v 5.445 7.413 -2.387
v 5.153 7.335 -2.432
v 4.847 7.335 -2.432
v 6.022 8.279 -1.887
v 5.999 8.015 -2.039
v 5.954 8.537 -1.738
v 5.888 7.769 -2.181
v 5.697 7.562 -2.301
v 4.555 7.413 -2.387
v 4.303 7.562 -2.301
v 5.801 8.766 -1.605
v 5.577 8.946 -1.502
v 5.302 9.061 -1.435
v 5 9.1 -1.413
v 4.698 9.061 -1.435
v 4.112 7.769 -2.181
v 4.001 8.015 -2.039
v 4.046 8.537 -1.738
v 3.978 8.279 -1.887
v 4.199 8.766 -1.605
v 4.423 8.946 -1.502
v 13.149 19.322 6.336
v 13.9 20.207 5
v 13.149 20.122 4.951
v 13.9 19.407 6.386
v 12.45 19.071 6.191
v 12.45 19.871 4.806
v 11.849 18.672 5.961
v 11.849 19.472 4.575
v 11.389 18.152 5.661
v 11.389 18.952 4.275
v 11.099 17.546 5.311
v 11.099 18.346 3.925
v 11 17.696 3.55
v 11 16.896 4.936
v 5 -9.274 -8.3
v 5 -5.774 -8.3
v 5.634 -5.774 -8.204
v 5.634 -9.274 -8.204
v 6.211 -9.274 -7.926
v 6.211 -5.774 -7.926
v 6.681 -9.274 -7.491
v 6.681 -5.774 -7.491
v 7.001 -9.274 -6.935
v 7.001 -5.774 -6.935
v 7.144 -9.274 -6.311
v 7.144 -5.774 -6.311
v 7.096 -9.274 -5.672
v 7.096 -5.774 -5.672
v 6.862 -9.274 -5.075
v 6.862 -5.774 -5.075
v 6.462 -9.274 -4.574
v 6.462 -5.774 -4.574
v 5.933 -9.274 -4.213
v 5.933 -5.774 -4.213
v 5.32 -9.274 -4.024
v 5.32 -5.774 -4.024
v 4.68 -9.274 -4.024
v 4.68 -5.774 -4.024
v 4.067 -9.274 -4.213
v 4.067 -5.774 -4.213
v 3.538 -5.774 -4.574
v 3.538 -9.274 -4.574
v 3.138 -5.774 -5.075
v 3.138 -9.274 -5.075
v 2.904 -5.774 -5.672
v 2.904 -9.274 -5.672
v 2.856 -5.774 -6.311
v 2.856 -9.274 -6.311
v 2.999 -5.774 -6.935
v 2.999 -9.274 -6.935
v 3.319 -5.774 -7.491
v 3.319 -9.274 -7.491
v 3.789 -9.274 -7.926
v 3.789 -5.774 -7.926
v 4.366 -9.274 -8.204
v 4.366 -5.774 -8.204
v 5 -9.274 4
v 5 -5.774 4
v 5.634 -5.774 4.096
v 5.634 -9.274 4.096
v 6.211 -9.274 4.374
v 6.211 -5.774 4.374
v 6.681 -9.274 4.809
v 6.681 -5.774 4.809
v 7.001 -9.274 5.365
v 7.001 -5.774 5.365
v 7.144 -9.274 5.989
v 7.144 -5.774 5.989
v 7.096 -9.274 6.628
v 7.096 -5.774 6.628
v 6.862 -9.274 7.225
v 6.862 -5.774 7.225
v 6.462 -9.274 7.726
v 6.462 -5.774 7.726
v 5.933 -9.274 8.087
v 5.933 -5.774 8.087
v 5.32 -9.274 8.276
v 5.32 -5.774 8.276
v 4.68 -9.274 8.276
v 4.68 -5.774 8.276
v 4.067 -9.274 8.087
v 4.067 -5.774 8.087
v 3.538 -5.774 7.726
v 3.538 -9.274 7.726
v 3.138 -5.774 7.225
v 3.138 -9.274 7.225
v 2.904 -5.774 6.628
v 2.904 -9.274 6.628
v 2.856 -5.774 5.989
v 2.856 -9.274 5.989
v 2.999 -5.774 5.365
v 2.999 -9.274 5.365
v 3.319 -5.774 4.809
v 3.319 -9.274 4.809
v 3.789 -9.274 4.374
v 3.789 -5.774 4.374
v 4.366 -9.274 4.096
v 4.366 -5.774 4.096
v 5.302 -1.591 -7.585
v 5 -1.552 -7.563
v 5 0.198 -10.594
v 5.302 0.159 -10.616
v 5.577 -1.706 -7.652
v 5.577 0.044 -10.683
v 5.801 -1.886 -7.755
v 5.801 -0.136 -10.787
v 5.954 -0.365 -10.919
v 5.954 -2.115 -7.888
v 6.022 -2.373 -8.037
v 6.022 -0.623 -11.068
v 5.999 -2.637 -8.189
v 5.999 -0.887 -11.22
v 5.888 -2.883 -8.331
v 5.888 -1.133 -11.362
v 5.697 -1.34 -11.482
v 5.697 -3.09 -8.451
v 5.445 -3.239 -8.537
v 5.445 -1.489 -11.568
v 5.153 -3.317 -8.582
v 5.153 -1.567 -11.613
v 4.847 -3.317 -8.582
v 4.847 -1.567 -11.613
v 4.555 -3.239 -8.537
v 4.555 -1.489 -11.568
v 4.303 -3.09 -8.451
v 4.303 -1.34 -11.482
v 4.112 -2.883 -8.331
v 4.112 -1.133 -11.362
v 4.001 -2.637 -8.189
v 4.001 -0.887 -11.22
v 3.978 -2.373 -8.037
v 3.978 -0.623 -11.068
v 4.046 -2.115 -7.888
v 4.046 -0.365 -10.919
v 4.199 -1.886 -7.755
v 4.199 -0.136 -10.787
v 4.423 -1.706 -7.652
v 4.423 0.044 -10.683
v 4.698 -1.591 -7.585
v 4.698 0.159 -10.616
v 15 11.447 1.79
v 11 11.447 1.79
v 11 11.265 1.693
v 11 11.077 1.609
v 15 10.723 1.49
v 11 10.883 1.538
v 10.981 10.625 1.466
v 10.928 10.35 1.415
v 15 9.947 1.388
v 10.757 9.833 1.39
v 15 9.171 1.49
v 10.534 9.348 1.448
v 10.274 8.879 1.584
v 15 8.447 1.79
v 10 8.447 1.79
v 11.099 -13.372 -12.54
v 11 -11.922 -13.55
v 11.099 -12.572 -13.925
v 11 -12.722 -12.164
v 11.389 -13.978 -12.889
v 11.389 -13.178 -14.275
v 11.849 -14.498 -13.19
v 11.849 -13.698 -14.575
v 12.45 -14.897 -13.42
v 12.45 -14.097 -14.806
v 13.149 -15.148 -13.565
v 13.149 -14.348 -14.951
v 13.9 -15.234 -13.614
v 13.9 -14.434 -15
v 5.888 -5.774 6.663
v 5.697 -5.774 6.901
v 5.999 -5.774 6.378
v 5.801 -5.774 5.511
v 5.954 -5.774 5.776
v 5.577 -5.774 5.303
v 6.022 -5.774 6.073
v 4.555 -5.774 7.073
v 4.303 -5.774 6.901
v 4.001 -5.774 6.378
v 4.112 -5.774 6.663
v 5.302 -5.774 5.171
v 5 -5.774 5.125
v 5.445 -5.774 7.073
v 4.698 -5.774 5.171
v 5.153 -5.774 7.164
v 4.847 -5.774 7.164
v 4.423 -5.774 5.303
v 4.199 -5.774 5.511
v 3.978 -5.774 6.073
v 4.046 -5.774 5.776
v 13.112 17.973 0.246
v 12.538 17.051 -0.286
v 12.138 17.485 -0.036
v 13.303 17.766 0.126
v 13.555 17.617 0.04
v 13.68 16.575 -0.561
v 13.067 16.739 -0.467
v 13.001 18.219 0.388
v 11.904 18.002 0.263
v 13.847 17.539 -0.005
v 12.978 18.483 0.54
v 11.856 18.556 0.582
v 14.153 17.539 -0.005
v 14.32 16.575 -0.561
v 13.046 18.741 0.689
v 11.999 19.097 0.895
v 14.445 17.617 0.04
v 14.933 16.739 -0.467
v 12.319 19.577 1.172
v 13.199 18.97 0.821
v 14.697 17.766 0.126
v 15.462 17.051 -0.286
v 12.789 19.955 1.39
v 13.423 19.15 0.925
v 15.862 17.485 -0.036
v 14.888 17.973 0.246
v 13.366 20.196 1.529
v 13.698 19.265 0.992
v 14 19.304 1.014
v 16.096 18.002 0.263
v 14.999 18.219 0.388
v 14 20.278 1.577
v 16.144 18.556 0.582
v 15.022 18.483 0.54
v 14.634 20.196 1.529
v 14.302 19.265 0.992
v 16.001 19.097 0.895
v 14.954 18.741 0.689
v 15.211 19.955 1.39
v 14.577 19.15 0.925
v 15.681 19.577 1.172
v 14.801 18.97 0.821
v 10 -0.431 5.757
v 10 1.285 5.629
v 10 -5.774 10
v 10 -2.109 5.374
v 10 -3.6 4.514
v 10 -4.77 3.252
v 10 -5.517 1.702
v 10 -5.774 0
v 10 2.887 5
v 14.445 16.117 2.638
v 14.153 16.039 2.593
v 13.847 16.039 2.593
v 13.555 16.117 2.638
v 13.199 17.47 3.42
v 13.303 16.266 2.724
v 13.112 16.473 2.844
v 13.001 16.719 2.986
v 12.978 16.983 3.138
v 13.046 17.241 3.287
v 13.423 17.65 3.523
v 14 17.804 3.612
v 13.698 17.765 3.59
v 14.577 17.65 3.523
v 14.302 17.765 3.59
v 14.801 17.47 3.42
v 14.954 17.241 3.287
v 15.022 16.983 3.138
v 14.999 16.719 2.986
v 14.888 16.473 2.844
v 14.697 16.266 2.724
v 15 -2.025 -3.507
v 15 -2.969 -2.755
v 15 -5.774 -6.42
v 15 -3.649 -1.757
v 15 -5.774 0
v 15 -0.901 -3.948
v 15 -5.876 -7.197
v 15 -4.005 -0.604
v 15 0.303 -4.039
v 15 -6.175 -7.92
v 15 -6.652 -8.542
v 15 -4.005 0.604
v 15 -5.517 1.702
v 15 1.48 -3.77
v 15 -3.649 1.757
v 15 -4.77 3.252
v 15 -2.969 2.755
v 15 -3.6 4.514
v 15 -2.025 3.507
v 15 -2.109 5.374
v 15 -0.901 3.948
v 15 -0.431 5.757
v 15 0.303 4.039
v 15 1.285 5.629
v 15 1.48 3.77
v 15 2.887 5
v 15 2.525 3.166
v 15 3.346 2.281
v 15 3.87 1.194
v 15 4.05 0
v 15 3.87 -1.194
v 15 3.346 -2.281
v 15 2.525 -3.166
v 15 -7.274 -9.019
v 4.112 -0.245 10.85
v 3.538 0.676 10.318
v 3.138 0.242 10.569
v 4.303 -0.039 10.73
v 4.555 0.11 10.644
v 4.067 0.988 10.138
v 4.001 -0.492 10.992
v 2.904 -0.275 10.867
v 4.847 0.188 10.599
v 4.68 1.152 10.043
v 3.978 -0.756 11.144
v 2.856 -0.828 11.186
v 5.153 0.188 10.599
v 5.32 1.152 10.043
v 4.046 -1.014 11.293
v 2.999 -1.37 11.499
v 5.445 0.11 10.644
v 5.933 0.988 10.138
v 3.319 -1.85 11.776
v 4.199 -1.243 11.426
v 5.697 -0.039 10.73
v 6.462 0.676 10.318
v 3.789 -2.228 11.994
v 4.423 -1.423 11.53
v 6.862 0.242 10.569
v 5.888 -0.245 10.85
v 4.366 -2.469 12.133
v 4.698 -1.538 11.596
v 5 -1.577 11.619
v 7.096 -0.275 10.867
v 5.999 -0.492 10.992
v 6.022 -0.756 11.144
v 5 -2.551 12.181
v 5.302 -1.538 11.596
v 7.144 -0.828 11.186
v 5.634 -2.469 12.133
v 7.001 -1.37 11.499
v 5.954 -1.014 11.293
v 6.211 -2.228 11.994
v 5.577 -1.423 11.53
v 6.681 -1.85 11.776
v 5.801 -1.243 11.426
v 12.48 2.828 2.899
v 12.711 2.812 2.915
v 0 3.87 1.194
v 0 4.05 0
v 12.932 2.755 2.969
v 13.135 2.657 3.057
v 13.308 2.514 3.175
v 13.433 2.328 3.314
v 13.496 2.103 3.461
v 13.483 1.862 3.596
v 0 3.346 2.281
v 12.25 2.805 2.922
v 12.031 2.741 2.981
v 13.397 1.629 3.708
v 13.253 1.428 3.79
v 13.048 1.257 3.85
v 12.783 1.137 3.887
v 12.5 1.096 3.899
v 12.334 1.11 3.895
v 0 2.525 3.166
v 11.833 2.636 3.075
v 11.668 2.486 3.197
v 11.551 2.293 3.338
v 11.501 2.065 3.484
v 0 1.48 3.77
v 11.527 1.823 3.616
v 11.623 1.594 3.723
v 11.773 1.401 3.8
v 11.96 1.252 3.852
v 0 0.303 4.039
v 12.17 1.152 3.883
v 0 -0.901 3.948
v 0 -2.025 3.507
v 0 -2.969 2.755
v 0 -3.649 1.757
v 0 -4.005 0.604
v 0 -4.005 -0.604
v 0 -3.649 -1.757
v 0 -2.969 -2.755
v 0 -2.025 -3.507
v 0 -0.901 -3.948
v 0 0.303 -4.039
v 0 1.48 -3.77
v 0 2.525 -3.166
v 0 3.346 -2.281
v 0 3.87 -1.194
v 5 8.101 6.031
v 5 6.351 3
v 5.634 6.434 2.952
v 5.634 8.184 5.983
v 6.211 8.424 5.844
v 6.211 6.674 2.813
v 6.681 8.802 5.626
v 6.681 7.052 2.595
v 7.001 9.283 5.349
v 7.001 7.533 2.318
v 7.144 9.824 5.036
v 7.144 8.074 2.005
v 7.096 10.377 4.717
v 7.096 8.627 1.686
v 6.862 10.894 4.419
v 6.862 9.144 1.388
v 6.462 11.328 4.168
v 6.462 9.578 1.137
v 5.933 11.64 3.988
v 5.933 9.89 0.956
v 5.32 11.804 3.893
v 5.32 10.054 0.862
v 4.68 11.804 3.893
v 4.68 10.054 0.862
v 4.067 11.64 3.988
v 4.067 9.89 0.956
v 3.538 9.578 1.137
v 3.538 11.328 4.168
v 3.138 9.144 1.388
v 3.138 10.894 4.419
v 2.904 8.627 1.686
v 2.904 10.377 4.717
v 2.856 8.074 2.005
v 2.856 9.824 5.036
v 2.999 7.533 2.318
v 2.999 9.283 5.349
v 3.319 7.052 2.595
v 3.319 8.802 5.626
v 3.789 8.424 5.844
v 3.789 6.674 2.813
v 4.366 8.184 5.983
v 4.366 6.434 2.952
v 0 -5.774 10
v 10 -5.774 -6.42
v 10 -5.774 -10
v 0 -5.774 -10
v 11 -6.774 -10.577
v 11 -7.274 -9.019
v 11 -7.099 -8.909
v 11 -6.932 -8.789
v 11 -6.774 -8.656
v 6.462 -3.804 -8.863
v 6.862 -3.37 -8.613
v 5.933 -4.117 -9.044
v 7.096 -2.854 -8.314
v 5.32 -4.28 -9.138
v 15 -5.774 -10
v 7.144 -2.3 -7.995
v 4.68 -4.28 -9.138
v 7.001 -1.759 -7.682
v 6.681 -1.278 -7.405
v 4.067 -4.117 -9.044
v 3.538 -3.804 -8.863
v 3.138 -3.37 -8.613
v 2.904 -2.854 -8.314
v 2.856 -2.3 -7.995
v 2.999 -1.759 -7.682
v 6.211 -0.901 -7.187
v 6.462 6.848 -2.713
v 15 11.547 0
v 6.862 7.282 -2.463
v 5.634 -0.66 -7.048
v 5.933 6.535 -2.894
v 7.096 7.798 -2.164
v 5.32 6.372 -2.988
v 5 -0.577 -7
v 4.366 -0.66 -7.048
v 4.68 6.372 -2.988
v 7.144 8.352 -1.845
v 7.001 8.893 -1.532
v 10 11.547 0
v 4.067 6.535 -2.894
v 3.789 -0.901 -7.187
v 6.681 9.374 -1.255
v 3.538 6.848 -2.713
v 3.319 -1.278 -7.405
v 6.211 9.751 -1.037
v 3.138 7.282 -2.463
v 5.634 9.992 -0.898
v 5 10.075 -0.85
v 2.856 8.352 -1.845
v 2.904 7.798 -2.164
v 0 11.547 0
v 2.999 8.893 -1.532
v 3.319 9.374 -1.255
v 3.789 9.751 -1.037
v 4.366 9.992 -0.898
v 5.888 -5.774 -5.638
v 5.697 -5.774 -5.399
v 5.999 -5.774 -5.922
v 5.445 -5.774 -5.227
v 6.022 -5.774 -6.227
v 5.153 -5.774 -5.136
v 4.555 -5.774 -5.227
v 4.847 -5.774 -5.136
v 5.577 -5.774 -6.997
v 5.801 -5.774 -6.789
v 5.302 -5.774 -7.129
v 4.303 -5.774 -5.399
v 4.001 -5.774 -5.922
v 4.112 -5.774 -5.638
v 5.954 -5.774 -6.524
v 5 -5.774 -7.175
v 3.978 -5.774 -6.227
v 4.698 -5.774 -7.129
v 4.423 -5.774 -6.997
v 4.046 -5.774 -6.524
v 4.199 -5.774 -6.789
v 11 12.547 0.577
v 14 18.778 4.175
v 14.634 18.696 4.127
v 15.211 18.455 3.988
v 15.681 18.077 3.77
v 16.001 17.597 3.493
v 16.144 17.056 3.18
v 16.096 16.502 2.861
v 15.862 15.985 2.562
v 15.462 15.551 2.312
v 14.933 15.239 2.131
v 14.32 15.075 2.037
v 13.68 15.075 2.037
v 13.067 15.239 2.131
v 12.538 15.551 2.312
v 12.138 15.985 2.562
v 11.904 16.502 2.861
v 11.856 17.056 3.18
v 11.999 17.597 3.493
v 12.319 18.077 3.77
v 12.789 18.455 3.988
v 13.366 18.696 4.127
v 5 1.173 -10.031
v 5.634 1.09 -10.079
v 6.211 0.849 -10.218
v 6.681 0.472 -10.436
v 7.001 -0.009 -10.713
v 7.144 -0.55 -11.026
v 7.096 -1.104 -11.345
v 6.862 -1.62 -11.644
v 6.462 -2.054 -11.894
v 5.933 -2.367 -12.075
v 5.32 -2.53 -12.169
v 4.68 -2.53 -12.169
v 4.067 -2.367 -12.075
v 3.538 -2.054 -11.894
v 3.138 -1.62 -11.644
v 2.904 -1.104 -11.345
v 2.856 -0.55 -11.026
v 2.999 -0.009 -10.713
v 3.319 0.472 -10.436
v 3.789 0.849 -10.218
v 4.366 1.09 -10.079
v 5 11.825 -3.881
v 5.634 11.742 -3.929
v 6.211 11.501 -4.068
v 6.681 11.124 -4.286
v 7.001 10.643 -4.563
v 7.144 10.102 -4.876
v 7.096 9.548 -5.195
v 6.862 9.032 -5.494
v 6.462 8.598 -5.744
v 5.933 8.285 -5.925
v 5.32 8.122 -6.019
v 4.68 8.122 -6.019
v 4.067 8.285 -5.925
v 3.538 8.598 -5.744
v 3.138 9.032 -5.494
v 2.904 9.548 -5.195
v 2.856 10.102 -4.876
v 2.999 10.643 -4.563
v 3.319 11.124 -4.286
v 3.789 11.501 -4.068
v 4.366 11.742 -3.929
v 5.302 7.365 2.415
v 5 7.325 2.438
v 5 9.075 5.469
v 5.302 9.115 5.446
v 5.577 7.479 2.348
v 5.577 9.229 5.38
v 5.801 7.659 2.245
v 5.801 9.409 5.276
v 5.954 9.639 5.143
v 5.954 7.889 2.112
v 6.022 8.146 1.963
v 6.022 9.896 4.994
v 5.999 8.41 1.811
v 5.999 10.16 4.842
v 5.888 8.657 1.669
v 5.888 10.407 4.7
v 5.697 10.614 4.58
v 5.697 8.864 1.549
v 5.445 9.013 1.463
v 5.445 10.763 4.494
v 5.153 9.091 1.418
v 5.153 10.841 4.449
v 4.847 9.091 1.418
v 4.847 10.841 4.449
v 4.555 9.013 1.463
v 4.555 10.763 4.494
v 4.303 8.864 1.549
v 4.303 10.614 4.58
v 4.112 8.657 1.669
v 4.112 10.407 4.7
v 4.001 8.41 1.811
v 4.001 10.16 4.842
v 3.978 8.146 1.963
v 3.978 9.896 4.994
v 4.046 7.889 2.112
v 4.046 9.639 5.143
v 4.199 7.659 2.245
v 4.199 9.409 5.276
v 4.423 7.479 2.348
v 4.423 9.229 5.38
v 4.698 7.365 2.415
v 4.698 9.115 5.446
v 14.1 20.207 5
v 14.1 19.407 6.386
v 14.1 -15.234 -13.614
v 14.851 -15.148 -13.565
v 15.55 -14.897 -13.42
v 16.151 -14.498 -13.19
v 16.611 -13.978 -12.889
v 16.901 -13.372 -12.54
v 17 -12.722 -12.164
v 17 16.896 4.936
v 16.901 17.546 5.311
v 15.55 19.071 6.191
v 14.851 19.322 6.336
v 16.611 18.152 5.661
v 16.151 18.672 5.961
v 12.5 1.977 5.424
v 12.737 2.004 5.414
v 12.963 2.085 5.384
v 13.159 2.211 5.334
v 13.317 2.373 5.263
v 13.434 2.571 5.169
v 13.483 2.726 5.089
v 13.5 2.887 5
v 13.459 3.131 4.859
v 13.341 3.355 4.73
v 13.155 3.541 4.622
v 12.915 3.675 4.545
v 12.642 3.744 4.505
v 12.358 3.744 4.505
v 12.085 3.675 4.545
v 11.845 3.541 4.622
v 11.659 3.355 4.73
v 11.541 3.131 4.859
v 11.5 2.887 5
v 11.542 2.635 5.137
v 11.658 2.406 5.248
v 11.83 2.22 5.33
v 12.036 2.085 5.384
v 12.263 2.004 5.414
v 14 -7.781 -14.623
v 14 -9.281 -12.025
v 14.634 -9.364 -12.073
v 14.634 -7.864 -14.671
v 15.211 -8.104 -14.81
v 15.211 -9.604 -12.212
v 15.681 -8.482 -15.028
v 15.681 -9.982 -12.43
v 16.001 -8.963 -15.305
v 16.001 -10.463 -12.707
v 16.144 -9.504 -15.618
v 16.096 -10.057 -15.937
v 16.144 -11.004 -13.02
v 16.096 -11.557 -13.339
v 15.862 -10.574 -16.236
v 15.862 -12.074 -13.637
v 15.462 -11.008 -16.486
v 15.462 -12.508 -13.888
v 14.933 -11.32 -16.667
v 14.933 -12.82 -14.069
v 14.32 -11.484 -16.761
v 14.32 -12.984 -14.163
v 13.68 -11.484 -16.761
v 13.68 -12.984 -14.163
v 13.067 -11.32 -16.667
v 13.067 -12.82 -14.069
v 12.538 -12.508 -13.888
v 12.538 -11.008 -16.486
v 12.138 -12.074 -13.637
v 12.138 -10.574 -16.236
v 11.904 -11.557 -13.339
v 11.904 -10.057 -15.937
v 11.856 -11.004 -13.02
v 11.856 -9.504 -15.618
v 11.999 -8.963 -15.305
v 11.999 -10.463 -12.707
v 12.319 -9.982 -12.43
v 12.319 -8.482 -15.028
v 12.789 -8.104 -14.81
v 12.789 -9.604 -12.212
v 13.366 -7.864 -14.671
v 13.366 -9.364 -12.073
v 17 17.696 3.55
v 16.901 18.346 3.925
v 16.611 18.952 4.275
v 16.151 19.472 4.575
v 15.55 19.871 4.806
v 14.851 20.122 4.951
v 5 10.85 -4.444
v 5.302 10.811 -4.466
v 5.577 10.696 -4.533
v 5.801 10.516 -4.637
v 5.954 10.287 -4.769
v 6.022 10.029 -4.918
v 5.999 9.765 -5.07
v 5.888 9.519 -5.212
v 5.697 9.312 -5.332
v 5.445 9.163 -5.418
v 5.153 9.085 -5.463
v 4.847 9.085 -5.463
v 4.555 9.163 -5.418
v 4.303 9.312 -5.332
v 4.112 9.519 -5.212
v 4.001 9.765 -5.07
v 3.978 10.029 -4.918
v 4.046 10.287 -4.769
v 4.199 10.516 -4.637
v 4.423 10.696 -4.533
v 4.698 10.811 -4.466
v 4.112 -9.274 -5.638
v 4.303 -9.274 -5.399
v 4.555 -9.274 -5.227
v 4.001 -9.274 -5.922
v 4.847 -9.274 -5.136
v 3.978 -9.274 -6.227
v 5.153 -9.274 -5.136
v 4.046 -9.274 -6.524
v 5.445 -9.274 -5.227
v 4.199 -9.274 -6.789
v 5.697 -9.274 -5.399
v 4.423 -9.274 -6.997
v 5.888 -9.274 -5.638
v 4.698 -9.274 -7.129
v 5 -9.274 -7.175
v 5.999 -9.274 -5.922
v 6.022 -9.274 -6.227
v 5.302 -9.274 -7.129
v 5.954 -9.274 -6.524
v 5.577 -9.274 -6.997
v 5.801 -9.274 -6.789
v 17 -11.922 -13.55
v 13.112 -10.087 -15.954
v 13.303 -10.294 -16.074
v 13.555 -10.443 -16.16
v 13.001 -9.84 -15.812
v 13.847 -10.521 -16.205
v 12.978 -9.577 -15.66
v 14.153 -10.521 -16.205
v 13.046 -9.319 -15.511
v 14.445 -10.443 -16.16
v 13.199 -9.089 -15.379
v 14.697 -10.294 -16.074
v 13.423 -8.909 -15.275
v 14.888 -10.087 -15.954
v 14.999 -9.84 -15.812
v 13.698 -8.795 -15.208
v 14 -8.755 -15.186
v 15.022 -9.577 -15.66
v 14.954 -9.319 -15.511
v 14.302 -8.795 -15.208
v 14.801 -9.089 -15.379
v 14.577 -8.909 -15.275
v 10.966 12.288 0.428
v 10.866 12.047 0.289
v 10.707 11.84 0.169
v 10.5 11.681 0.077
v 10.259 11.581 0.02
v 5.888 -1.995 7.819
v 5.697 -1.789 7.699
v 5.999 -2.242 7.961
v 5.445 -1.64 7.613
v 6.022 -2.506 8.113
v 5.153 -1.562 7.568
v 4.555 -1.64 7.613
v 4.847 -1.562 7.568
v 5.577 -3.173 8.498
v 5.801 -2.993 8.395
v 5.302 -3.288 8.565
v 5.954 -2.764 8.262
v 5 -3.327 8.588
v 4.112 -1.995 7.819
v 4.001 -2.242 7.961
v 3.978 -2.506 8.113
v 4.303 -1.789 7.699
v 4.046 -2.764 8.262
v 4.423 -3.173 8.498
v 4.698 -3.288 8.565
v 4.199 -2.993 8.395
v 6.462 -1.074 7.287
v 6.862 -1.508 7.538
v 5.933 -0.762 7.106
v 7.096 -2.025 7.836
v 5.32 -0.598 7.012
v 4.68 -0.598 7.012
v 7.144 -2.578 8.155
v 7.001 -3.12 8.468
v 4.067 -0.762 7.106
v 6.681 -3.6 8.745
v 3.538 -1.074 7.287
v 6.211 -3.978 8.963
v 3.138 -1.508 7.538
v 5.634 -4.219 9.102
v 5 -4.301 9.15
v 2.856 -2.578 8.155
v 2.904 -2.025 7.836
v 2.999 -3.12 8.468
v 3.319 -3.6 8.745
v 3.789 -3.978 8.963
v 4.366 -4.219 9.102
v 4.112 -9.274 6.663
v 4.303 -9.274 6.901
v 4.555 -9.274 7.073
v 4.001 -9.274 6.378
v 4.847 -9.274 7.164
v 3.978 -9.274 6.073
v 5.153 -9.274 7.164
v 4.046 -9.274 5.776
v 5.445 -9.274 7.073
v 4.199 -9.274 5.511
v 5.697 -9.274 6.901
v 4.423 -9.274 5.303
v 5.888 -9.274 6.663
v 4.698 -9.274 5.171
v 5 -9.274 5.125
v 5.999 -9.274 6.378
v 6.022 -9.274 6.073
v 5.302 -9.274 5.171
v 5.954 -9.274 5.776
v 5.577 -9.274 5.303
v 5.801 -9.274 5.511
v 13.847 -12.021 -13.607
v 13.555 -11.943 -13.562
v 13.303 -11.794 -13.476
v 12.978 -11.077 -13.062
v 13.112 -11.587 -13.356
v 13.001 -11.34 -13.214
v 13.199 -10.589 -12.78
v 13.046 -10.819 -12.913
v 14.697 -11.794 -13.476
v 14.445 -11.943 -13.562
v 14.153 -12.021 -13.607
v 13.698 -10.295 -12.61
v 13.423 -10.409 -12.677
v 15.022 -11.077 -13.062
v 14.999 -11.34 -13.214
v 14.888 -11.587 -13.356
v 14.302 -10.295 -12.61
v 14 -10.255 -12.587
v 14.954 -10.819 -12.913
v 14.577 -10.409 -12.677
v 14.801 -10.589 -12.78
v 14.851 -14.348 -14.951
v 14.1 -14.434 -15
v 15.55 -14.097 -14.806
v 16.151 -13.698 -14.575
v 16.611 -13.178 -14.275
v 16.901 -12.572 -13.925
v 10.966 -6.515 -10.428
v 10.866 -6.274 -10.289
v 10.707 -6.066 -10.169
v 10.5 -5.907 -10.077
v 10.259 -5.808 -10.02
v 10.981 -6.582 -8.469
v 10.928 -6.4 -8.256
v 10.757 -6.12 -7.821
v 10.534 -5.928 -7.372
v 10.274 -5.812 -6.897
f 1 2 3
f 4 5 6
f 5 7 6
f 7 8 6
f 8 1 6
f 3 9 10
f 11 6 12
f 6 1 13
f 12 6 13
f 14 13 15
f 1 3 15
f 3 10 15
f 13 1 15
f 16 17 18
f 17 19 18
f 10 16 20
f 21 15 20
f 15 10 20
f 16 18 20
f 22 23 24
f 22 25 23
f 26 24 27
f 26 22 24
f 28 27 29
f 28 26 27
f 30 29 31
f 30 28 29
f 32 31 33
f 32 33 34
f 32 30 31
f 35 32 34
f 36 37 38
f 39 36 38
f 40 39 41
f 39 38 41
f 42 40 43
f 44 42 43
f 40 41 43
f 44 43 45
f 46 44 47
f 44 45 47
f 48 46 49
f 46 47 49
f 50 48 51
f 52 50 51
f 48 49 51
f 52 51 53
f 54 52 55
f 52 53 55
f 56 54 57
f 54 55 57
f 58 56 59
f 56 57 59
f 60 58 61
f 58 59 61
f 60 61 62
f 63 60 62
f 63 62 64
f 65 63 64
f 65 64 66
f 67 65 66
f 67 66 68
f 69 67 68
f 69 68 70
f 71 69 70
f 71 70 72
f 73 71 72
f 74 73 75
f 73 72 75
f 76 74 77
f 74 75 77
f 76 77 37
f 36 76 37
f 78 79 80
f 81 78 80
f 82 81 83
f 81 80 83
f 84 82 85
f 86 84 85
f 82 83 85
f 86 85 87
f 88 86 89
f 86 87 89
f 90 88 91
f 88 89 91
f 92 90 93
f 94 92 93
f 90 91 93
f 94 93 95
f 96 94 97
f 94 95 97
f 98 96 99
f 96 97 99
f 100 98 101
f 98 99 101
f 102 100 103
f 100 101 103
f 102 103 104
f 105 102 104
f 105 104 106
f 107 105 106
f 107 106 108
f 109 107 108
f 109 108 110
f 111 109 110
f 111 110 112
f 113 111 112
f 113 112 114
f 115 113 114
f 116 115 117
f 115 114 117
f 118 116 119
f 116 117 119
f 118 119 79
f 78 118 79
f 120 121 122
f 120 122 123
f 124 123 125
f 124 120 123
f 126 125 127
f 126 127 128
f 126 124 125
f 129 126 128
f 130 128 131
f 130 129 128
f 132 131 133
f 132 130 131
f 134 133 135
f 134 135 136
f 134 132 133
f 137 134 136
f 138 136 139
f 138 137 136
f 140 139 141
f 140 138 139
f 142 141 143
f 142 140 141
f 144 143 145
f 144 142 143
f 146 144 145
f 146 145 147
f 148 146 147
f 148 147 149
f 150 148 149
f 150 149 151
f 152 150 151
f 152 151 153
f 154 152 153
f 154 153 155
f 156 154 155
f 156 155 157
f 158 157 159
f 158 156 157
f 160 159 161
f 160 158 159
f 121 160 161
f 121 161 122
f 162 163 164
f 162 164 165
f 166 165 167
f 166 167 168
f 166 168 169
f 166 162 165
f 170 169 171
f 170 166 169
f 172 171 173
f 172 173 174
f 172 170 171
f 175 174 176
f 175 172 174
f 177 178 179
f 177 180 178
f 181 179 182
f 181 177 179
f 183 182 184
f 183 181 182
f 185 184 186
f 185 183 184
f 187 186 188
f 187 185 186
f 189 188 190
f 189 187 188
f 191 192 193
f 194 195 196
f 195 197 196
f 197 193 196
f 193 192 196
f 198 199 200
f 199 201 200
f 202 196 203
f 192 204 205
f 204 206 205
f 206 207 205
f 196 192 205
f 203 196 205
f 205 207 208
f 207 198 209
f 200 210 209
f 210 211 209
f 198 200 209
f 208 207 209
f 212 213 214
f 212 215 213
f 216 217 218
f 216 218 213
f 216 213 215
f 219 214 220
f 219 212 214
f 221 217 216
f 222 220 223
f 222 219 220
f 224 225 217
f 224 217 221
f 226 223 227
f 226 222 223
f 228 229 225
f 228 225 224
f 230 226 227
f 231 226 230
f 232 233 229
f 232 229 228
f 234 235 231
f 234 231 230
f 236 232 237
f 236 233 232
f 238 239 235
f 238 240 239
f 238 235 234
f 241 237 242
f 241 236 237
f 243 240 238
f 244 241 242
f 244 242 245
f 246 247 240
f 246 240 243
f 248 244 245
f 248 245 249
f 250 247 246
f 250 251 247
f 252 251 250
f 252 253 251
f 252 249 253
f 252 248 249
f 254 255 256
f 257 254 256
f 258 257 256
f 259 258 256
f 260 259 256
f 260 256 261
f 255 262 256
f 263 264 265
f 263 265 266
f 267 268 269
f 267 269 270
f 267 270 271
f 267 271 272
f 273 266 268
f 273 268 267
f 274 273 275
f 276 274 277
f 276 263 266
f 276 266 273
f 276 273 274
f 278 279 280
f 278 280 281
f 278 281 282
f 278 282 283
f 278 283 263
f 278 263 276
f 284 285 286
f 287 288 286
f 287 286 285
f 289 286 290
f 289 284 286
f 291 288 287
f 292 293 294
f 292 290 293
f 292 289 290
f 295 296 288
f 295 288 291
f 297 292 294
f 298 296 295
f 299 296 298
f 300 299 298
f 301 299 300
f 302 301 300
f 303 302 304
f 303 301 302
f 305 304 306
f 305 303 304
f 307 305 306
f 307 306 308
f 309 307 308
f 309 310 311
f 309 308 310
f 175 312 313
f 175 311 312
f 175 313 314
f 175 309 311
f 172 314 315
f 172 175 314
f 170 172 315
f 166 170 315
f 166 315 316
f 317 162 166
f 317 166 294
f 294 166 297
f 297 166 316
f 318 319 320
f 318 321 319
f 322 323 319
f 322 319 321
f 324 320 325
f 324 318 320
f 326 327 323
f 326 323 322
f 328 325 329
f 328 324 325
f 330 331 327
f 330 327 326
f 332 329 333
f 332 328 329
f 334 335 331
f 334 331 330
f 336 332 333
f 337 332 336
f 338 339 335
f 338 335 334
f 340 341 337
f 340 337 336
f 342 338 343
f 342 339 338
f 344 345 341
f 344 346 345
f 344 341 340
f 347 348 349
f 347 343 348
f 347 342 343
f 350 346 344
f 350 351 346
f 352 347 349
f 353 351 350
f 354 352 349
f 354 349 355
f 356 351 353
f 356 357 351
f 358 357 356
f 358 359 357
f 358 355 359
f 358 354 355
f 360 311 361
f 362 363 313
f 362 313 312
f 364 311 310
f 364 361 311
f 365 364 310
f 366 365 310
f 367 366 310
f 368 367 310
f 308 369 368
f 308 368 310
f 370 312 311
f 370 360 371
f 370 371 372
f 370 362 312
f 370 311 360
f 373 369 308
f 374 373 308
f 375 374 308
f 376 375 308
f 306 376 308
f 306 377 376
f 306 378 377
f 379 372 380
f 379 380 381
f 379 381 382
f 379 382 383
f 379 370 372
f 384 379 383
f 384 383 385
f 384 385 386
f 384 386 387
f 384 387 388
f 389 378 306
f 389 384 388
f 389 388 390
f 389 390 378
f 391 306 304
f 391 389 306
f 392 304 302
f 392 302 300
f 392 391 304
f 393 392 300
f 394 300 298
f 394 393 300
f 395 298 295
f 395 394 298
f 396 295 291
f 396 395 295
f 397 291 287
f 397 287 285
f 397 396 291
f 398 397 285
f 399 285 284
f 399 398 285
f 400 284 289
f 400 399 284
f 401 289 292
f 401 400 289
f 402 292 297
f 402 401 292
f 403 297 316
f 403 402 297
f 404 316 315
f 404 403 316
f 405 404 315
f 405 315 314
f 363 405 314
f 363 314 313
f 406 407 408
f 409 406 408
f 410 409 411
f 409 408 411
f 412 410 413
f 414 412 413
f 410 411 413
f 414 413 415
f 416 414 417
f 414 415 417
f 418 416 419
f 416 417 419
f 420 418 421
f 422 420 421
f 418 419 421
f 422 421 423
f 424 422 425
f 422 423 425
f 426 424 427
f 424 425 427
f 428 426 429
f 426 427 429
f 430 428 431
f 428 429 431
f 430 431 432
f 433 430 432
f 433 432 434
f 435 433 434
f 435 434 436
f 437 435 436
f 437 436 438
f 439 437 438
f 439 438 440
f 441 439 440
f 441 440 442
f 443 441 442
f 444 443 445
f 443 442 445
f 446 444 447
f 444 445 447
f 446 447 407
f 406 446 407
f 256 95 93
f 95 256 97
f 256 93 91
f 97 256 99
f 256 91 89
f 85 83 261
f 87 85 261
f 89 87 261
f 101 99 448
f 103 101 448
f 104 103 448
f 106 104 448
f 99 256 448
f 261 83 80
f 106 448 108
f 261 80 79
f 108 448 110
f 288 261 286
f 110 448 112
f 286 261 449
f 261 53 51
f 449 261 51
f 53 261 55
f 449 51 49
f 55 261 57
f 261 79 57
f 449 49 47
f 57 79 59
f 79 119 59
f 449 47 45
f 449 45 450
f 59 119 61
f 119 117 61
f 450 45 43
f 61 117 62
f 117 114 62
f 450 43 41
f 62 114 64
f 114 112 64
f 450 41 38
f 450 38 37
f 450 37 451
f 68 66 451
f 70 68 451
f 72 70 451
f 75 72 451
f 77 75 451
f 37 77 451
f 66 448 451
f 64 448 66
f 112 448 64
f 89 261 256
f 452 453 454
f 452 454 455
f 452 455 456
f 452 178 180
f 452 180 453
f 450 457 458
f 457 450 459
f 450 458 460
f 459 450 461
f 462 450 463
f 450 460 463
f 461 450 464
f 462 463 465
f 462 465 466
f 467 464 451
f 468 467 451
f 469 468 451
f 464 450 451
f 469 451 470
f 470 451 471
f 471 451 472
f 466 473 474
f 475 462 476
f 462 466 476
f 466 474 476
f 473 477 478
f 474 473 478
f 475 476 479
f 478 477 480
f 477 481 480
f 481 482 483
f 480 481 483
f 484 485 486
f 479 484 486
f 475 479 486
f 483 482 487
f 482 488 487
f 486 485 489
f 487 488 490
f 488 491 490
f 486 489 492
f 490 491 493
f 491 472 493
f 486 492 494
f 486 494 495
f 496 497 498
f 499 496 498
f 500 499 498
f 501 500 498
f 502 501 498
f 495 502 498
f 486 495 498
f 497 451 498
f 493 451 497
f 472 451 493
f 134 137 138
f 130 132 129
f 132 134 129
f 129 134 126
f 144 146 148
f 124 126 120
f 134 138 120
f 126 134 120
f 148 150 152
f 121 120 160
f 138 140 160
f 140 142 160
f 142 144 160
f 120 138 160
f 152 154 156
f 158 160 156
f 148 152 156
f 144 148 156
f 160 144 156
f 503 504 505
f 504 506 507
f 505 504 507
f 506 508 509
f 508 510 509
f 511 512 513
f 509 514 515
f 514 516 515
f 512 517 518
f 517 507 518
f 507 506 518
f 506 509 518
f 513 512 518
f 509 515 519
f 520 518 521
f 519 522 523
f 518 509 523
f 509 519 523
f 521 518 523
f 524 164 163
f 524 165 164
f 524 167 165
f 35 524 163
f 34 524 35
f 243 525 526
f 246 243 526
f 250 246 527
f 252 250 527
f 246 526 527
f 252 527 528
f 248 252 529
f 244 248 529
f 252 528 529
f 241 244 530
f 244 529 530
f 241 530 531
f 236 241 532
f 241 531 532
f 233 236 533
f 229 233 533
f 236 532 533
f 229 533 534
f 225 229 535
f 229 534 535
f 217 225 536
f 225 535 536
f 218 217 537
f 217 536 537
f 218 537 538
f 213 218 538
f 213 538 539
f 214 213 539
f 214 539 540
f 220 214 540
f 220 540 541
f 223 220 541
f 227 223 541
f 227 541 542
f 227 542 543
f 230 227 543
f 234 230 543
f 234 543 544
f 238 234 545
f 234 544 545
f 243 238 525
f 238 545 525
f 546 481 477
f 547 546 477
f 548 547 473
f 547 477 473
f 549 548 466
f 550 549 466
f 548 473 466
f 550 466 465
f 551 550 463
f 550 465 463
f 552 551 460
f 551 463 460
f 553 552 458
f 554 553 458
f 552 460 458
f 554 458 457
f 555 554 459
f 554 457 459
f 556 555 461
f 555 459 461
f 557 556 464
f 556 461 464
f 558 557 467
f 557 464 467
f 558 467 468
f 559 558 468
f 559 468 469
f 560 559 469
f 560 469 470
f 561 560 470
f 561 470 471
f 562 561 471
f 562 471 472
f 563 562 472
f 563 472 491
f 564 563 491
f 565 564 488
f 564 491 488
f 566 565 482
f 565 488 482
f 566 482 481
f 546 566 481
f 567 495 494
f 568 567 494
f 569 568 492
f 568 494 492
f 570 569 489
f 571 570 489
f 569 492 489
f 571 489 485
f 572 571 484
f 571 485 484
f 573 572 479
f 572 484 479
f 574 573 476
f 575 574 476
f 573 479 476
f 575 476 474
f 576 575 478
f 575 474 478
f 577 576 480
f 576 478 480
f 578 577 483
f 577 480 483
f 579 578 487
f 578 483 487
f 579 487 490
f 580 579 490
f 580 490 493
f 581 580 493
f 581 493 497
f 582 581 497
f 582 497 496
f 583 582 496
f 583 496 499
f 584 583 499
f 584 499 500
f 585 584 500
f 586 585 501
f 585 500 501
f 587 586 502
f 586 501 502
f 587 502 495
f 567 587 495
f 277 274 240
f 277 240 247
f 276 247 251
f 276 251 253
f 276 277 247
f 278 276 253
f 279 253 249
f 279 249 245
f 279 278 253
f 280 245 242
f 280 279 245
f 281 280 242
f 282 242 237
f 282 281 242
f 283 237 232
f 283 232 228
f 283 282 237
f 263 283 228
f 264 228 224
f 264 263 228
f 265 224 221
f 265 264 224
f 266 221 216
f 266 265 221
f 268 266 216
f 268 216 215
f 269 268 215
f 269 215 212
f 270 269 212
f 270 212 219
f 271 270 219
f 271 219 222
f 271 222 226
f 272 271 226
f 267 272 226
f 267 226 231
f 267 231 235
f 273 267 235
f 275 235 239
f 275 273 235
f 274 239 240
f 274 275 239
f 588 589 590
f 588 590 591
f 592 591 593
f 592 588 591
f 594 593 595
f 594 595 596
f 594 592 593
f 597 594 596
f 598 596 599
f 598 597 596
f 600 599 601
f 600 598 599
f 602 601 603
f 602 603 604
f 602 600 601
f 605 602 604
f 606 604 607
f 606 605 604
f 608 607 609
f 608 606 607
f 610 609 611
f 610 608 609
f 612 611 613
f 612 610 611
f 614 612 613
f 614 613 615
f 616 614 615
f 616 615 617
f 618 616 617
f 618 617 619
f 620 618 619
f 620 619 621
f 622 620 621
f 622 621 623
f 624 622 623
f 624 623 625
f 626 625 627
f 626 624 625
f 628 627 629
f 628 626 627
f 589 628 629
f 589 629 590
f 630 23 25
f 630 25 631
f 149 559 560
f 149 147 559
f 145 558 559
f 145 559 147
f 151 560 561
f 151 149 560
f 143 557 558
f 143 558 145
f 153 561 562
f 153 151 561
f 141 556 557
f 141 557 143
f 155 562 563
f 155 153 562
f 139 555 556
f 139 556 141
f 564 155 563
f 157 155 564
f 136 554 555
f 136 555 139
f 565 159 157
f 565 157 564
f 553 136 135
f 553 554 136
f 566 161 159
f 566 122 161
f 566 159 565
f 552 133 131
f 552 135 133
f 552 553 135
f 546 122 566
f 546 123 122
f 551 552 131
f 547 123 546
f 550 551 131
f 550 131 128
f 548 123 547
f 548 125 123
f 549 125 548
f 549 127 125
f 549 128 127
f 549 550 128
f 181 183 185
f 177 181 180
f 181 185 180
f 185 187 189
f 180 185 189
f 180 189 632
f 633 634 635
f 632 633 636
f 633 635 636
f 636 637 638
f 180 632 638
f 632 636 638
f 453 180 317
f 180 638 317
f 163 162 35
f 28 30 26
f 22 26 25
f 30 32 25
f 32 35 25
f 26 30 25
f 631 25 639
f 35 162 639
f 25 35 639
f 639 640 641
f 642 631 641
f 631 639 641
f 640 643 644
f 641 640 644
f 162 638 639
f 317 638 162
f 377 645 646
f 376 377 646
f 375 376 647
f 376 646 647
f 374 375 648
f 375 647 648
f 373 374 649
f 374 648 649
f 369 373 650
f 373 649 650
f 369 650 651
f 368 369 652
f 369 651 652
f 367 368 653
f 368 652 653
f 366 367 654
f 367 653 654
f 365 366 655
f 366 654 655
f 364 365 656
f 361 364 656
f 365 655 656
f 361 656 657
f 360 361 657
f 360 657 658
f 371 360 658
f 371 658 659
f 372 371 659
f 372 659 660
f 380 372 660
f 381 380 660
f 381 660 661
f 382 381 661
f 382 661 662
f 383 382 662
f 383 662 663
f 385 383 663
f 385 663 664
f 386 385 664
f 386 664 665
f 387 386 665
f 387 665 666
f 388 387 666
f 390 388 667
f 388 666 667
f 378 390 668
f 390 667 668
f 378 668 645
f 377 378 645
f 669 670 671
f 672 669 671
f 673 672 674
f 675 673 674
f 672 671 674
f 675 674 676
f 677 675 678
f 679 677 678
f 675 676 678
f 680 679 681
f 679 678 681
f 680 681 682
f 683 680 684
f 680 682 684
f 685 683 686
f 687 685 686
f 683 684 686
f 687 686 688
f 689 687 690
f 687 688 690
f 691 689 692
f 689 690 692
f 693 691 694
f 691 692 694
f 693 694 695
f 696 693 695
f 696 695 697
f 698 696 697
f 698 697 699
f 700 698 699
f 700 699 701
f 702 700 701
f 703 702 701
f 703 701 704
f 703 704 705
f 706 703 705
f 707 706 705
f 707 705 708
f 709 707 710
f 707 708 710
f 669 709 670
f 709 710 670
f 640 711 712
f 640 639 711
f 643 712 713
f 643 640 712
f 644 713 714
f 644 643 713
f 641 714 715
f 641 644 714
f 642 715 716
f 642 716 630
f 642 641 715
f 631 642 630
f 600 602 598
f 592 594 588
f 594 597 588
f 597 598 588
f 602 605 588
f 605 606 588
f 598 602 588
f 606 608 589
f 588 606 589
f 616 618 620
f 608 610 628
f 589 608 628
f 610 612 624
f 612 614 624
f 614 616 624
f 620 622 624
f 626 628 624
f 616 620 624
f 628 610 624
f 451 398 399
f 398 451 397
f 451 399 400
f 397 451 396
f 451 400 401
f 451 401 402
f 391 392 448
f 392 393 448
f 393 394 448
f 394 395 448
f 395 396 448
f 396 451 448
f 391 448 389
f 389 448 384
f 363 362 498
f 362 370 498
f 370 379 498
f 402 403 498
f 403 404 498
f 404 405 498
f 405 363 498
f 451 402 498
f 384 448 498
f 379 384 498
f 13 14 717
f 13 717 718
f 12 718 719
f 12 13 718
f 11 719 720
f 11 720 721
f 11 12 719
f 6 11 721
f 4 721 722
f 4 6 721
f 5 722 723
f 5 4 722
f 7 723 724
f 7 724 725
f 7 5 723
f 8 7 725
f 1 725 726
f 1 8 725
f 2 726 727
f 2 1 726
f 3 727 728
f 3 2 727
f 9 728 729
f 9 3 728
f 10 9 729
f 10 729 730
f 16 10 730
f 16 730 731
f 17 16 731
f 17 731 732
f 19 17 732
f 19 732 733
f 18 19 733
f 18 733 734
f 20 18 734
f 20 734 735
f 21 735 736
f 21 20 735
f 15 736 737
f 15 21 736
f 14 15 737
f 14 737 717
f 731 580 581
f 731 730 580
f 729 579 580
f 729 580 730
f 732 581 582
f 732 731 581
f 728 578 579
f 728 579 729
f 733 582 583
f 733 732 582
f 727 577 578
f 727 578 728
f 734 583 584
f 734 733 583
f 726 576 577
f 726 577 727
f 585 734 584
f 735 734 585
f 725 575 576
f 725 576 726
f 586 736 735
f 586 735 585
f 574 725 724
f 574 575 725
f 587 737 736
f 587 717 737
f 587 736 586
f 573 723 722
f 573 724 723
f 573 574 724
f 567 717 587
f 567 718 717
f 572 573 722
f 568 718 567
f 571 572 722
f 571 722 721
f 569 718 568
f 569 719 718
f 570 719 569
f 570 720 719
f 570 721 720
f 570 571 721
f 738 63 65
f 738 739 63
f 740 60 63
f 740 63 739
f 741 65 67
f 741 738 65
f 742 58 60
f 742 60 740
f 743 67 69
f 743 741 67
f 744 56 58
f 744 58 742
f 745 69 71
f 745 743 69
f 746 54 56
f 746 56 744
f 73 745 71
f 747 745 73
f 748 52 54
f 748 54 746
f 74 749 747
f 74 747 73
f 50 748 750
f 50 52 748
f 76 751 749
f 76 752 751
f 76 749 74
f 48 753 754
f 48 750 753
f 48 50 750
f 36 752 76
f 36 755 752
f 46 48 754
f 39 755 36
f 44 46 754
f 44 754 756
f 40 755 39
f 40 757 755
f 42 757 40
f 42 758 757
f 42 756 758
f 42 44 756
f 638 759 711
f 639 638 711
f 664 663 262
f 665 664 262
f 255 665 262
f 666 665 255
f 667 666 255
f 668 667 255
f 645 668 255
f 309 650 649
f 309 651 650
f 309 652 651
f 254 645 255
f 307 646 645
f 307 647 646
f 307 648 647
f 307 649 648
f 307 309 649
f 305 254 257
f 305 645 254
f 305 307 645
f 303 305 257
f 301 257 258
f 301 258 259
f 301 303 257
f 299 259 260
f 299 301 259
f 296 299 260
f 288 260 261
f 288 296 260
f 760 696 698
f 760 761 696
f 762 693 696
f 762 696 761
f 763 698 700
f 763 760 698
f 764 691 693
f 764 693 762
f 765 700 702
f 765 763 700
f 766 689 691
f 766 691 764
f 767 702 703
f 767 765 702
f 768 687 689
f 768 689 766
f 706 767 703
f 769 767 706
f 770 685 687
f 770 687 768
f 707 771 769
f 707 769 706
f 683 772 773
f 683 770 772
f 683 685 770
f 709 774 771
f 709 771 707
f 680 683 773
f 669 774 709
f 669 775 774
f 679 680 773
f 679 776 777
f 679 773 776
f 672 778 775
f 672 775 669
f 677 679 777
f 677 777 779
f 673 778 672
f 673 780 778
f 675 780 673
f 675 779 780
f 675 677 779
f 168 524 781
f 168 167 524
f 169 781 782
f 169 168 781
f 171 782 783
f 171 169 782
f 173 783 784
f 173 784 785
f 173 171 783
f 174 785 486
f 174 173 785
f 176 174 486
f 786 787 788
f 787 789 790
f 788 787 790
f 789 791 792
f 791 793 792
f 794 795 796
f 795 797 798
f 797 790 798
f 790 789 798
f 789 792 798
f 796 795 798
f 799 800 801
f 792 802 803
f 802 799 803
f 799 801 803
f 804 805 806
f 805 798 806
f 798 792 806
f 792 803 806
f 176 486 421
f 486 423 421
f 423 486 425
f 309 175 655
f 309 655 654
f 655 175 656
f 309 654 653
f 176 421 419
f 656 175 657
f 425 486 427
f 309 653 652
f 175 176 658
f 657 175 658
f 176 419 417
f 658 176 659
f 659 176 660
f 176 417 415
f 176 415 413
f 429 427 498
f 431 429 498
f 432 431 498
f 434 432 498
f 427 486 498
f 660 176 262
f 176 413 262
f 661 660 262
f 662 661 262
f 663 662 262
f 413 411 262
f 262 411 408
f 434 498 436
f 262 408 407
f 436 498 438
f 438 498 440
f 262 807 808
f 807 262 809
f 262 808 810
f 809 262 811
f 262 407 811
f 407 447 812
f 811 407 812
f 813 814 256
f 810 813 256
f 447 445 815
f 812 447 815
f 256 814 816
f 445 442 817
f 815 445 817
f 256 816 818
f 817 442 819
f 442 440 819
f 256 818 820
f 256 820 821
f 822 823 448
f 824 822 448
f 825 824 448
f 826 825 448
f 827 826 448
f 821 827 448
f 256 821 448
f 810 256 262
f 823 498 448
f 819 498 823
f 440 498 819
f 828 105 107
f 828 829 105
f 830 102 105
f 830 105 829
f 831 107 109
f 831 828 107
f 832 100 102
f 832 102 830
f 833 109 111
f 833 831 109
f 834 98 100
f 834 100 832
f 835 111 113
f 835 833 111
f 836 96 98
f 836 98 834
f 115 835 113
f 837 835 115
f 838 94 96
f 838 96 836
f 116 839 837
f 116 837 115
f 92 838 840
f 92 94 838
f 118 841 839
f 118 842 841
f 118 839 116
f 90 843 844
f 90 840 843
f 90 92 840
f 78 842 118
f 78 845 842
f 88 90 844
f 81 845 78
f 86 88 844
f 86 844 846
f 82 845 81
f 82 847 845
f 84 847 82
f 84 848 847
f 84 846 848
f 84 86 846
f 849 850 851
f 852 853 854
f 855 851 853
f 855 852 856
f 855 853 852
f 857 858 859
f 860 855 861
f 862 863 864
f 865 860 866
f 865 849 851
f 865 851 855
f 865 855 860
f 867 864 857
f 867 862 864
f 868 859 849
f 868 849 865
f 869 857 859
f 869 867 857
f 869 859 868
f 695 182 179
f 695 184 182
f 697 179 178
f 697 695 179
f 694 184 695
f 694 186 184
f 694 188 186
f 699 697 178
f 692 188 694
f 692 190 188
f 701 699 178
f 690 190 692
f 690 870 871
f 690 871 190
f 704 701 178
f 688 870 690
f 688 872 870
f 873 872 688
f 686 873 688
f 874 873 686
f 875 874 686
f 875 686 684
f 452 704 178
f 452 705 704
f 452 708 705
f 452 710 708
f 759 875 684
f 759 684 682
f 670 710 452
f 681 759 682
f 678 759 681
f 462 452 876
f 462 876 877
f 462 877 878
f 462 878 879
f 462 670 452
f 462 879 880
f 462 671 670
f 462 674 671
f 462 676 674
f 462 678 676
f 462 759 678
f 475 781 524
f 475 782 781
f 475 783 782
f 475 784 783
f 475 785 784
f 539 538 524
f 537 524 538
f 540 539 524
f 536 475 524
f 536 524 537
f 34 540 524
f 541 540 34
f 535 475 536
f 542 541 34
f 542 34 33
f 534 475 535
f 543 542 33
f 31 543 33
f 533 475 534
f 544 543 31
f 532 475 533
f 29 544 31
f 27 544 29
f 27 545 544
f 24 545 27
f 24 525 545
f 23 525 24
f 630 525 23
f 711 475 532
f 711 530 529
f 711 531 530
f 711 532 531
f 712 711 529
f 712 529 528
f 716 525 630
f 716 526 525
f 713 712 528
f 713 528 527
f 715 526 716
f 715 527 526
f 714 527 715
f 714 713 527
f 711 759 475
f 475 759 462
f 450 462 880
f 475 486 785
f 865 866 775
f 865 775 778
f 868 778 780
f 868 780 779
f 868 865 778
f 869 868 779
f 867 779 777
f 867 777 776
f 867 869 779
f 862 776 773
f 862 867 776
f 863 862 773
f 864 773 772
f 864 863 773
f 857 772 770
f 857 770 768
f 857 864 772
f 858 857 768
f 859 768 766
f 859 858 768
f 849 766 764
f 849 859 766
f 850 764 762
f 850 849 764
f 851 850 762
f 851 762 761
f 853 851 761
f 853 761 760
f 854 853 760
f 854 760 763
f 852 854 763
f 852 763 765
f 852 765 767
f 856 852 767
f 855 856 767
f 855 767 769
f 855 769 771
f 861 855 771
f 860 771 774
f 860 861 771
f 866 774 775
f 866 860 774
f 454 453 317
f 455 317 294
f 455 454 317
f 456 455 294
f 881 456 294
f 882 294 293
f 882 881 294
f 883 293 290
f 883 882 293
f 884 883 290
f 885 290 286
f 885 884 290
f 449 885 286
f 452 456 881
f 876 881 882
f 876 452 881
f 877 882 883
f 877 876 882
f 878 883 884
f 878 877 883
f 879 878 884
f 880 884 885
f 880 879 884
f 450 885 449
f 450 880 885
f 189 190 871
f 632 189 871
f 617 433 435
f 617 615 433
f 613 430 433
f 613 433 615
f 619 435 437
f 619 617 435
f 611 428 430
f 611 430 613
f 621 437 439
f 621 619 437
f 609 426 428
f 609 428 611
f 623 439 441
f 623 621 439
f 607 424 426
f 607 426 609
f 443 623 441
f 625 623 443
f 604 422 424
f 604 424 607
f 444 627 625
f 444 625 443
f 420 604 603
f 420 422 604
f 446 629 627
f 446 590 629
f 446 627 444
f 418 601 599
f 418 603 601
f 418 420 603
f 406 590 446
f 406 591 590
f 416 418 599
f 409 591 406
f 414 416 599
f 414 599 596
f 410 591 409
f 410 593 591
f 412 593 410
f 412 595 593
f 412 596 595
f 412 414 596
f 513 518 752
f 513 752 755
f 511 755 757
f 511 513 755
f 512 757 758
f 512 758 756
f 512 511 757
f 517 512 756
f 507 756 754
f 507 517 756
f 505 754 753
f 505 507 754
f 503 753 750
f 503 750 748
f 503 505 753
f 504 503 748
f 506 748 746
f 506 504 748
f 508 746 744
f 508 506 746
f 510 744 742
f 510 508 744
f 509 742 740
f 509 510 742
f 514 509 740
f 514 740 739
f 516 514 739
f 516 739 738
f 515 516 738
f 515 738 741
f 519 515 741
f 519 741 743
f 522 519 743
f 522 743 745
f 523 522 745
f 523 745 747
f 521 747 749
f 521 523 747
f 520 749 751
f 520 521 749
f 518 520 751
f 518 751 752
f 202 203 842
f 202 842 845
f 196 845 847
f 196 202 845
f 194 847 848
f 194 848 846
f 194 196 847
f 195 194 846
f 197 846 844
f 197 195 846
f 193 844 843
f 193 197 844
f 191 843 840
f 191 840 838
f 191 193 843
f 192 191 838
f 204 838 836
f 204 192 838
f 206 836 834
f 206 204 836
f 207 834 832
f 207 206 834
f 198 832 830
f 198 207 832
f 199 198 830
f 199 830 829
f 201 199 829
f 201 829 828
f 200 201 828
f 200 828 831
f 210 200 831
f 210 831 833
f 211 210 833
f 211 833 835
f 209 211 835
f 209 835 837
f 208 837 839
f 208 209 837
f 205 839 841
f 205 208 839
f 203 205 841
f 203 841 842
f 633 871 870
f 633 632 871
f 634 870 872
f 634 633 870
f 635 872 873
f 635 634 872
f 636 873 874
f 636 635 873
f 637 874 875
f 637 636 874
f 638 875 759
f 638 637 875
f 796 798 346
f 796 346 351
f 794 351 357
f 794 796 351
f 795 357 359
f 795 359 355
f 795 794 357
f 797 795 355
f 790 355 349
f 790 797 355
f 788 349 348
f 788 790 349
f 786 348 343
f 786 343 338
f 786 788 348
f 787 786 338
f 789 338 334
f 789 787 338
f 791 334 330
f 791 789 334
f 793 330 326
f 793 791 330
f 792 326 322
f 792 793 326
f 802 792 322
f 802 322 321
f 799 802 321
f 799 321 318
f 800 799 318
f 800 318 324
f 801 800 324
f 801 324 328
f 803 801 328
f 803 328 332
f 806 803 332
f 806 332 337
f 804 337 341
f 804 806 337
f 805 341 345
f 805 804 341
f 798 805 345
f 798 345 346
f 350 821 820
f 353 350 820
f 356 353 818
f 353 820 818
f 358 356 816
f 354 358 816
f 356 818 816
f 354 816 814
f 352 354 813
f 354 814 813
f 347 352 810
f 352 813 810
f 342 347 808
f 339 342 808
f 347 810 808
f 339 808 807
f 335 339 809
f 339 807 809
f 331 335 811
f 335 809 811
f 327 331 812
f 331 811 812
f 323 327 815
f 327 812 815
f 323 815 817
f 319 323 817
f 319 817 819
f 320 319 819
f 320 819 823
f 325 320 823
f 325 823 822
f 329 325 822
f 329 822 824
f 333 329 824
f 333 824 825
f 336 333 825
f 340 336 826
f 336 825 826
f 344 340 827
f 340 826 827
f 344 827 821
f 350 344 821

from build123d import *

# Parameters (mm, degrees)
SKETCH_R           = 4.05
PAD_DEPTH          = 15
SKETCH001_R        = 2.15
SKETCH001_R_2      = 1.025
PAD001_DEPTH       = 3.5
POLARPATTERN_COUNT = 3
POLARPATTERN_ANGLE = 240
SKETCH002_R        = 1
POCKET_DEPTH       = 5
SKETCH003_W        = 40
SKETCH003_H        = 6
PAD002_DEPTH       = 1.6
SKETCH004_R        = 2.15
SKETCH004_R_2      = 1.025
PAD003_DEPTH       = 3
POCKET001_DEPTH    = 5
FILLET_R           = 3
FILLET001_R        = 2.9
FILLET002_R        = 1
FILLET003_R        = 1


with BuildPart() as part:
    # Sketch → Pad (new body)
    with BuildSketch(Plane.YZ):
        Polygon((-5.7735026919, 10), (-5.7735026919, -10), (11.5470053838, 0), align=None)
        Circle(SKETCH_R, mode=Mode.SUBTRACT)
    extrude(amount=PAD_DEPTH)

    # Sketch001 (on Face1 of Pad) → Pad001 (join)
    with BuildSketch(Plane(origin=(0, -5.7735026919, 0), x_dir=(0, 0, -1), z_dir=(0, -1, 0))):
        with Locations((6.15, 5)):
            Circle(SKETCH001_R)
        with Locations((6.15, 5)):
            Circle(SKETCH001_R_2, mode=Mode.SUBTRACT)
        with Locations((-6.15, 5)):
            Circle(SKETCH001_R)
        with Locations((-6.15, 5)):
            Circle(SKETCH001_R_2, mode=Mode.SUBTRACT)
    pad001 = extrude(amount=PAD001_DEPTH)

    # PolarPattern: Pad001 ×3 about axis
    polarpattern_axis = Axis((0, 0, 0), (1, 0, 0))
    for i in range(1, POLARPATTERN_COUNT):
        add(pad001.rotate(polarpattern_axis, i * POLARPATTERN_ANGLE / (POLARPATTERN_COUNT - 1)))

    # Sketch002 (on Face2 of PolarPattern) → Pocket (cut)
    with BuildSketch(Plane(origin=(0, 2.8867513459, 5), x_dir=(0, -0.8660254038, 0.5), z_dir=(0, 0.5, 0.8660254038))):
        with Locations((0, 12.5)):
            Circle(SKETCH002_R)
    extrude(amount=-POCKET_DEPTH, mode=Mode.SUBTRACT)

    # Sketch003 (on Face5 of Pocket) → Pad002 (join)
    with BuildSketch(Plane(origin=(0, 2.8867513459, -5), x_dir=(0, 0.8660254038, 0.5), z_dir=(0, 0.5, -0.8660254038))):
        with Locations((0, 14)):
            Rectangle(SKETCH003_W, SKETCH003_H)
    extrude(amount=-PAD002_DEPTH)

    # Sketch004 (on Face14 of Pad002) → Pad003 (join)
    with BuildSketch(Plane(origin=(0, 2.8867513459, -5), x_dir=(0, 0.8660254038, 0.5), z_dir=(0, 0.5, -0.8660254038))):
        with Locations((-16.2, 14)):
            Circle(SKETCH004_R)
        with Locations((-16.2, 14)):
            Circle(SKETCH004_R_2, mode=Mode.SUBTRACT)
        with Locations((16.2, 14)):
            Circle(SKETCH004_R)
        with Locations((16.2, 14)):
            Circle(SKETCH004_R_2, mode=Mode.SUBTRACT)
    extrude(amount=PAD003_DEPTH)

    # Sketch005 (on Face6 of Pad003) → Pocket001 (cut)
    with BuildSketch(Plane.YZ.offset(15)):
        with BuildLine():
            Line((-5.7735026919, 0), (-5.7735026919, 10))
            Line((-5.7735026919, 10), (2.8867345187, 5.0000097152))
            ThreePointArc((2.8867345187, 5.0000097152), (-2.8867597595, 4.9999951424), (-5.7735026919, 0))
        make_face()
    extrude(amount=-POCKET001_DEPTH, mode=Mode.SUBTRACT)

    # Fillet
    fillet_edges = [part.edges().sort_by_distance(p)[0] for p in [
        (13, 9.947005, 0.92376),
        (13, -5.773503, -8.152479),
    ]]
    fillet(fillet_edges, radius=FILLET_R)

    # Fillet001
    fillet001_edges = [part.edges().sort_by_distance(p)[0] for p in [
        (17, -14.833757, -14.30718),
        (11, -14.833757, -14.30718),
        (17, 19.807259, 5.69282),
        (11, 19.807259, 5.69282),
    ]]
    fillet(fillet001_edges, radius=FILLET001_R)

    # Fillet002
    fillet002_edges = [part.edges().sort_by_distance(p)[0] for p in [
        (11, -5.773503, -9.07624),
        (11, -5.773503, -7.286454),
    ]]
    fillet(fillet002_edges, radius=FILLET002_R)

    # Fillet003
    fillet003_edges = [part.edges().sort_by_distance(p)[0] for p in [
        (11, 9.197005, 1.356773),
        (11, 10.747005, 0.46188),
    ]]
    fillet(fillet003_edges, radius=FILLET003_R)


solid = part.part
